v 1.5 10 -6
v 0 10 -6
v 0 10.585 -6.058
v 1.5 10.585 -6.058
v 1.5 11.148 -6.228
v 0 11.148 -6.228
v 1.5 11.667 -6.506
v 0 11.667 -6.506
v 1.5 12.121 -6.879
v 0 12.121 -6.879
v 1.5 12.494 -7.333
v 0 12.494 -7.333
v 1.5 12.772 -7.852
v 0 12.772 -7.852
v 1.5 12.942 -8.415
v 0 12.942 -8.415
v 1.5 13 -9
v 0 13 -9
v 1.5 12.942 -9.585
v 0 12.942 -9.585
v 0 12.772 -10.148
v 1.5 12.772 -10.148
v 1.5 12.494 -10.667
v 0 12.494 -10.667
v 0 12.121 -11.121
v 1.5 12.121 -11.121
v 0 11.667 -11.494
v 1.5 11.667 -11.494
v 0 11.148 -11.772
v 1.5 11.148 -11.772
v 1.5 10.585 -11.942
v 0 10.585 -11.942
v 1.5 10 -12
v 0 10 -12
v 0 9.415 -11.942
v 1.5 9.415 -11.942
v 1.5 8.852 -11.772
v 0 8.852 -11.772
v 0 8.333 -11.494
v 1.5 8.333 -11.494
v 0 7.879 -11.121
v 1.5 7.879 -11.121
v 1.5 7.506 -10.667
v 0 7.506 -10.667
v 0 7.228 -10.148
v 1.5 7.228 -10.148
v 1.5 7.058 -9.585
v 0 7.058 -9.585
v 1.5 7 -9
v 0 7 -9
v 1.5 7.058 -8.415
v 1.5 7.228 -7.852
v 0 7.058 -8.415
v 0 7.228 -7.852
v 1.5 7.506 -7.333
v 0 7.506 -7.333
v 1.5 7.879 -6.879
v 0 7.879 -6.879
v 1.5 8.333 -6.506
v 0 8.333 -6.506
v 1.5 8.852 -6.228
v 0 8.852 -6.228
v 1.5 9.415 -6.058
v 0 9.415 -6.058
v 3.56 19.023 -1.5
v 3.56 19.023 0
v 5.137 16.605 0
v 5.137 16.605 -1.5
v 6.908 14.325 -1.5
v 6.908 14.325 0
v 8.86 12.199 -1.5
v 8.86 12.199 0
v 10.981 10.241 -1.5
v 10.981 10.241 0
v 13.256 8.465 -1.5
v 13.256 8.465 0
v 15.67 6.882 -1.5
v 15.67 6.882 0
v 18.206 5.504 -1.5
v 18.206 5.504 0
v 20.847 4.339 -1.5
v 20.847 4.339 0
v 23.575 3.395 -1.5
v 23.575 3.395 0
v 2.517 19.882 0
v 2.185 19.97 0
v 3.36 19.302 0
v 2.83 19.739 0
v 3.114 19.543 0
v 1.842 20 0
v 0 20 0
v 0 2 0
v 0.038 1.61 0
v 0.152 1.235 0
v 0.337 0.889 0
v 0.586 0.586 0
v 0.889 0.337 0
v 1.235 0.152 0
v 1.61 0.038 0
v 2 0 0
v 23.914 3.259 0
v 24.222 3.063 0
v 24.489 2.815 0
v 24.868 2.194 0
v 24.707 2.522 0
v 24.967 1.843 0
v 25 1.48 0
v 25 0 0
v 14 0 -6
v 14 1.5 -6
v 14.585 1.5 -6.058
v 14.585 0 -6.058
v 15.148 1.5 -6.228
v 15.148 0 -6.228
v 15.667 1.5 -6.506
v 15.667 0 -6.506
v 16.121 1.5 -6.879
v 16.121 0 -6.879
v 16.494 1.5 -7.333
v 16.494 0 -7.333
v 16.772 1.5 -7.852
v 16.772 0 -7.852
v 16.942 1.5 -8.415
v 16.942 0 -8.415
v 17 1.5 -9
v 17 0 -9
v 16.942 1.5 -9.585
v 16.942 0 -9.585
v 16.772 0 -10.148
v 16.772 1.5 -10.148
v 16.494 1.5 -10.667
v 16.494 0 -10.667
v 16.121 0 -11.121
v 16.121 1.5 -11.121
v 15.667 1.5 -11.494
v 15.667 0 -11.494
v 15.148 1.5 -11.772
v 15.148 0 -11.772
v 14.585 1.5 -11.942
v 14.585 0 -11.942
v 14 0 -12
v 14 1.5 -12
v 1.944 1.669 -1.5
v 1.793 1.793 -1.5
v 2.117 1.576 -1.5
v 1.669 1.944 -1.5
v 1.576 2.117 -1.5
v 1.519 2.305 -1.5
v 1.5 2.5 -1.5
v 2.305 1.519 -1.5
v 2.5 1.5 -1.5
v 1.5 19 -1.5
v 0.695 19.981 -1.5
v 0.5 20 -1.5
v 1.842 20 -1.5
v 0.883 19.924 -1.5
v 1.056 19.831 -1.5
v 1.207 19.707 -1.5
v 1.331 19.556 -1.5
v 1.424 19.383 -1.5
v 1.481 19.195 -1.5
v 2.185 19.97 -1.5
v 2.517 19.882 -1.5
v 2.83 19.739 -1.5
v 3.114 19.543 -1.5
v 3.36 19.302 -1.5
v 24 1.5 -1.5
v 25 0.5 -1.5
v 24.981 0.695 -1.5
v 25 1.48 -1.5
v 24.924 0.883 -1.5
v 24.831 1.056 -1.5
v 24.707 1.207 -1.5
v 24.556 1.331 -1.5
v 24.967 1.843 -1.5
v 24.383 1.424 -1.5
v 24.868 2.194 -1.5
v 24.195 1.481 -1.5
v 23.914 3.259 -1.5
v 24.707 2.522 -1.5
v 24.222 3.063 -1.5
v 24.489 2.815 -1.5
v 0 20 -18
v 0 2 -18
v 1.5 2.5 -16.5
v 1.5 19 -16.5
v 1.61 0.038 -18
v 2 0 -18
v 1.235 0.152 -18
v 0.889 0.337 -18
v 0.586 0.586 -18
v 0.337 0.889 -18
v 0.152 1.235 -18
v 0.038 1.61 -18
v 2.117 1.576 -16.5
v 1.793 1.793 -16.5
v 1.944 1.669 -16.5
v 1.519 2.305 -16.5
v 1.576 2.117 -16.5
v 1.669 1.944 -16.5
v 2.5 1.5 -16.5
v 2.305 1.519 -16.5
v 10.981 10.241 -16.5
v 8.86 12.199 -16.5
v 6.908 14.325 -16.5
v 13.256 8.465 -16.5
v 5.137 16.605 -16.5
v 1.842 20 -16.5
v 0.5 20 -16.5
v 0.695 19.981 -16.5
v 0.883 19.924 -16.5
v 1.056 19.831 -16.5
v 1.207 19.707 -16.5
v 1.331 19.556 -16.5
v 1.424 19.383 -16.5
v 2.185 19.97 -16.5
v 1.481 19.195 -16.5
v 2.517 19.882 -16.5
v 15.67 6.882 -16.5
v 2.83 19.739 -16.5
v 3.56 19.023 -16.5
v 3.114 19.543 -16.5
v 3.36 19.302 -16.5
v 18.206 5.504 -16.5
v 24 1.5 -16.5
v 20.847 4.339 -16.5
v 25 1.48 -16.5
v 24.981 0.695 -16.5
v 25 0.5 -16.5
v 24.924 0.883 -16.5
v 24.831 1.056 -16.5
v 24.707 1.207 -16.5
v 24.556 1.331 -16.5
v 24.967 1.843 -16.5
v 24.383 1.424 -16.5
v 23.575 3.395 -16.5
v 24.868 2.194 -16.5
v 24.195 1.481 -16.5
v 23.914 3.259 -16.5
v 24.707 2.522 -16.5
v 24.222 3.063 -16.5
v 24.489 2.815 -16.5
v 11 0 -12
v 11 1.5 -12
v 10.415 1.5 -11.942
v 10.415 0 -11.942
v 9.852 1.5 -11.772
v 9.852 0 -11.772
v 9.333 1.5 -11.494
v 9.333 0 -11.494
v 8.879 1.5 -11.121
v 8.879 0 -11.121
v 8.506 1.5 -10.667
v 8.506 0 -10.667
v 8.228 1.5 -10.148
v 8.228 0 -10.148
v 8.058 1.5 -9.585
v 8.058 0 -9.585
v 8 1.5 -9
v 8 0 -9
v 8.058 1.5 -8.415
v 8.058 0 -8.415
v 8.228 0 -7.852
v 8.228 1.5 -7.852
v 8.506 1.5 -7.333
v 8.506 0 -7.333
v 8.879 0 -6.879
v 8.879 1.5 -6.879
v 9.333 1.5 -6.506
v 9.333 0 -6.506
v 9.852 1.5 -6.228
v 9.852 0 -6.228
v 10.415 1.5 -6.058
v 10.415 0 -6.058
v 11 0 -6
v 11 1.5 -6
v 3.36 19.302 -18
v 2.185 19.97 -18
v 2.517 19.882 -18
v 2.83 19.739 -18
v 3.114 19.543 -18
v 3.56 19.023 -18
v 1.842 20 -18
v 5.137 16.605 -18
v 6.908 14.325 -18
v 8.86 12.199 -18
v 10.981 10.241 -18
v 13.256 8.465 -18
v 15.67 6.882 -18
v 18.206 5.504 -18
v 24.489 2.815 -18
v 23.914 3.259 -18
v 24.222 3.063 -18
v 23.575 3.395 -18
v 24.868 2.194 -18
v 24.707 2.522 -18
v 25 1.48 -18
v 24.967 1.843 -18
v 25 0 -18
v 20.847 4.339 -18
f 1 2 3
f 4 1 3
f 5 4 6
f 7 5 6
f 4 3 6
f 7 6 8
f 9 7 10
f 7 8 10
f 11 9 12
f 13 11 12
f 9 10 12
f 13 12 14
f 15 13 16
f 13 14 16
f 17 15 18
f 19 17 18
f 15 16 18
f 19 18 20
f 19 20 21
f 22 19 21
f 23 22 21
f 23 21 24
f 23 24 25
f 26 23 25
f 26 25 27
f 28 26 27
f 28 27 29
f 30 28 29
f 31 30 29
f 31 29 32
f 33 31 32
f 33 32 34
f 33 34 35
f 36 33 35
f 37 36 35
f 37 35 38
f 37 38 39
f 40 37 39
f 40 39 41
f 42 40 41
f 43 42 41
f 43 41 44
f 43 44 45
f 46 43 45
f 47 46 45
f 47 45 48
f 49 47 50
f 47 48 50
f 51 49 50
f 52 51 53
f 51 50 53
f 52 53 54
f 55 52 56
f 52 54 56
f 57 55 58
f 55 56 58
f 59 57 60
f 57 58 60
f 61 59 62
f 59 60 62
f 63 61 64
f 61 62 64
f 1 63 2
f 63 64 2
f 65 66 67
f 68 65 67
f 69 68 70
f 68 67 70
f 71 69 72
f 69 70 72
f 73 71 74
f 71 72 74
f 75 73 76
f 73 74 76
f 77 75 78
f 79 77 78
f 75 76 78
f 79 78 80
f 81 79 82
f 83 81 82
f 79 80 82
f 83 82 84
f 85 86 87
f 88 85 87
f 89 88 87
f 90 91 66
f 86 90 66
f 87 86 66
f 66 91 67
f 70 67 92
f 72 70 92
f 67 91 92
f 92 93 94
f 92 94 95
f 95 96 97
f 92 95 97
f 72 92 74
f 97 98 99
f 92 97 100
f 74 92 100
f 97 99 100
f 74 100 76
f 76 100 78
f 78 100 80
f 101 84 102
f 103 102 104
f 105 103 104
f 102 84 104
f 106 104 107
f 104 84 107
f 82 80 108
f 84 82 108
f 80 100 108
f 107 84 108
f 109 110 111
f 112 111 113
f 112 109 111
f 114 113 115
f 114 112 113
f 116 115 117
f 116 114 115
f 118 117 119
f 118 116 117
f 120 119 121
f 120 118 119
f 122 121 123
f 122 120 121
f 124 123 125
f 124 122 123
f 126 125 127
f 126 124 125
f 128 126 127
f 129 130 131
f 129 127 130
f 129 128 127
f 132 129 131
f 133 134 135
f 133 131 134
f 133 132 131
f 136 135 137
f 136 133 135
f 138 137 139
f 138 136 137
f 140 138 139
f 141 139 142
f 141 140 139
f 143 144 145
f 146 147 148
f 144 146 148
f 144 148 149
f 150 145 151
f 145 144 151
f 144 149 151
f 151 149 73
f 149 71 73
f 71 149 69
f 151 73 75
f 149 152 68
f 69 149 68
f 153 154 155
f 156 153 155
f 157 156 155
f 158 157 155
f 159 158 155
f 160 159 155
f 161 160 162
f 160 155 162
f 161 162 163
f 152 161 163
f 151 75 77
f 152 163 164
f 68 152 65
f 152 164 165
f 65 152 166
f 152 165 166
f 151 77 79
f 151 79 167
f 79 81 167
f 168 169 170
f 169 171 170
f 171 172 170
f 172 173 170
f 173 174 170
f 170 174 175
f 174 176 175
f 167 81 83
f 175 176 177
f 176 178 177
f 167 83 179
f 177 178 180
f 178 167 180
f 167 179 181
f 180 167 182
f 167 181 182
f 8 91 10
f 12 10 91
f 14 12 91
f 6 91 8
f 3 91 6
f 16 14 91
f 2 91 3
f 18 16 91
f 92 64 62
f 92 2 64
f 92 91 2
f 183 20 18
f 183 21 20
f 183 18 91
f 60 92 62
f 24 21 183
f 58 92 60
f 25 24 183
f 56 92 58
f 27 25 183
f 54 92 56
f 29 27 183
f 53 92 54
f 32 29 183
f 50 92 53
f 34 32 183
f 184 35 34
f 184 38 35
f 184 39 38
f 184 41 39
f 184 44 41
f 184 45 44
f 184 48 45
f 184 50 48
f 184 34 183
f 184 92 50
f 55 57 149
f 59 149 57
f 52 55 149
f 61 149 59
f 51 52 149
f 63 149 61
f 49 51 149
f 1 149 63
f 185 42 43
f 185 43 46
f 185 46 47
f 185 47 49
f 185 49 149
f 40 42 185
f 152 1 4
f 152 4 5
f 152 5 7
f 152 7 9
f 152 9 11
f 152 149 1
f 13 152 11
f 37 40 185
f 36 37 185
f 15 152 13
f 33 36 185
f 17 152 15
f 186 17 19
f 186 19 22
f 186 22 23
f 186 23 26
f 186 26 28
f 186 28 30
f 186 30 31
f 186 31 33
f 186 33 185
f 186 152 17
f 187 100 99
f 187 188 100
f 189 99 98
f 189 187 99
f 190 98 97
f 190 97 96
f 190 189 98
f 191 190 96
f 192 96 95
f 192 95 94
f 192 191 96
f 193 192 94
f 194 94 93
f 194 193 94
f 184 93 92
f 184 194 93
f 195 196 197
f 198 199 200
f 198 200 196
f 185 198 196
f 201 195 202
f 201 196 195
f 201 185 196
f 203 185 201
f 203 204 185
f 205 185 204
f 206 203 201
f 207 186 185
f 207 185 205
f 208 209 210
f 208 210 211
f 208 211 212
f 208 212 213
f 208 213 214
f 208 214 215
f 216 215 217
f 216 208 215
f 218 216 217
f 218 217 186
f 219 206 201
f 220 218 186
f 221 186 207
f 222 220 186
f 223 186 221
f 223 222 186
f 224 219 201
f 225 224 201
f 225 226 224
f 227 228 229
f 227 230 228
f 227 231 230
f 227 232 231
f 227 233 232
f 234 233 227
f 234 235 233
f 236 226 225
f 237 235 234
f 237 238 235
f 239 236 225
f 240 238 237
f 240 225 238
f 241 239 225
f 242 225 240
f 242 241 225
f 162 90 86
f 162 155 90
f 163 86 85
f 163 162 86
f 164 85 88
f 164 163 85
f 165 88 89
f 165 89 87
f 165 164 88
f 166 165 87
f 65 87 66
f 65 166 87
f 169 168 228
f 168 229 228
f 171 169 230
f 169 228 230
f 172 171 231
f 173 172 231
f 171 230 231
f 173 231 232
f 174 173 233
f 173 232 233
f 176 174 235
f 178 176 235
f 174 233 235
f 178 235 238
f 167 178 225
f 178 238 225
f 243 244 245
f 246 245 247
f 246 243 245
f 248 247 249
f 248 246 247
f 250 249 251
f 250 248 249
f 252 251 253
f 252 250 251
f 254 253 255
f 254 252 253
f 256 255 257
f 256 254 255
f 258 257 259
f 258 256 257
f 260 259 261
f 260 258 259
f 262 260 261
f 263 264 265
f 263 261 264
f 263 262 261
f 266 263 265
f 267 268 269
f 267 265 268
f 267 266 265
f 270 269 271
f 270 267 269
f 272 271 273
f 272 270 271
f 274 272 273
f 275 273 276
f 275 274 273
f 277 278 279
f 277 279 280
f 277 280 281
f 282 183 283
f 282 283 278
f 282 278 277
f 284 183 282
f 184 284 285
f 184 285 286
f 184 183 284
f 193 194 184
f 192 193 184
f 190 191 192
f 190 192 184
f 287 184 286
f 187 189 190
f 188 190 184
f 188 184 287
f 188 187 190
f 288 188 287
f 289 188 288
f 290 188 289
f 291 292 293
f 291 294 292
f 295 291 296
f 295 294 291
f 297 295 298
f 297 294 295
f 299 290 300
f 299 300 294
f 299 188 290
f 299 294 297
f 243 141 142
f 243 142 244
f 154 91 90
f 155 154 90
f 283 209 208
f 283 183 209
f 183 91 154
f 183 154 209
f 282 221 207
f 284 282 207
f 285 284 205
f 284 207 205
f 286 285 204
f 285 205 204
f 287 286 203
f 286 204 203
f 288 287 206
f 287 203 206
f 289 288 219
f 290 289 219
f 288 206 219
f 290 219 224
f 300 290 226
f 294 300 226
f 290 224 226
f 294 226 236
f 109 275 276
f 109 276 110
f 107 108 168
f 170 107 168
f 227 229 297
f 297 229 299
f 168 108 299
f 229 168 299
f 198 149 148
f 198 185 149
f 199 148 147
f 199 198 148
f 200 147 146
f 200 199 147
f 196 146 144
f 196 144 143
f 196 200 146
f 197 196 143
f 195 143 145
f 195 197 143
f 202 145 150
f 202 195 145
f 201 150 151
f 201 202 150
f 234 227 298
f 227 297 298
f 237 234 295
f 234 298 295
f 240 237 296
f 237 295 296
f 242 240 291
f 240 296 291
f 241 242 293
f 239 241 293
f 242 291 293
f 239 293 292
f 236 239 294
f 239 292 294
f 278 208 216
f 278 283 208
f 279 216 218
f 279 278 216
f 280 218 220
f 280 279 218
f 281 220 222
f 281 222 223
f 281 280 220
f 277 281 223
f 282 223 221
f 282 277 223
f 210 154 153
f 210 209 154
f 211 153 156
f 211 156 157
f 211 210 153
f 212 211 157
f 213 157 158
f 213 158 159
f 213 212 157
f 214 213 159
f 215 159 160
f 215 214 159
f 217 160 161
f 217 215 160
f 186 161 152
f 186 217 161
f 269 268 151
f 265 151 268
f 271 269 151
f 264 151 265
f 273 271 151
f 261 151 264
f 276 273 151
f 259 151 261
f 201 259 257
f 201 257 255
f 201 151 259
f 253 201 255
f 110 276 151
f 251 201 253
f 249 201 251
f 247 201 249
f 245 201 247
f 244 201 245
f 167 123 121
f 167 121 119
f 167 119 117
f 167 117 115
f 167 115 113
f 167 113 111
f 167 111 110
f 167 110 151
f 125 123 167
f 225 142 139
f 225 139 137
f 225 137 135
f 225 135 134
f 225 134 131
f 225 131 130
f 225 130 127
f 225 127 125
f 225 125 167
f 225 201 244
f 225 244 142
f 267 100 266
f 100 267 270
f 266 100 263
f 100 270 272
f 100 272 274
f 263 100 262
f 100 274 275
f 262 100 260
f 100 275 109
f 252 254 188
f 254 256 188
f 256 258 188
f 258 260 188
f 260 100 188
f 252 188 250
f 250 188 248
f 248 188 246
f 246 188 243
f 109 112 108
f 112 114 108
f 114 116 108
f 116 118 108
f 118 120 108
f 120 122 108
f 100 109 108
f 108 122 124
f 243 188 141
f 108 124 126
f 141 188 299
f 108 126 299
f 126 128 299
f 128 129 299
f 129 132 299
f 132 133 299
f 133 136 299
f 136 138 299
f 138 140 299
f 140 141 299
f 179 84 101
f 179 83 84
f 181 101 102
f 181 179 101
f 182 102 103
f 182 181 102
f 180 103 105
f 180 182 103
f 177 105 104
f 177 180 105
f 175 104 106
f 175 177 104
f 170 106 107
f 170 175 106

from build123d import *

# Parameters (mm, degrees)
SKETCH_1_W          = 25
SKETCH_1_H          = 18
EXTRUDE_1_DEPTH     = 20
CUT_EXTRUDE_1_DEPTH = 20
SKETCH_3_R          = 3
CUT_EXTRUDE_2_DEPTH = 26
CUT_EXTRUDE_3_DEPTH = 21.0000001
SKETCH_5_W          = 23.5
SKETCH_5_H          = 15
CUT_EXTRUDE_4_DEPTH = 18.5
FILLET_1_R          = 1
FILLET_2_R          = 2


with BuildPart() as part:
    # 스케치1 → 보스-돌출1 (new body)
    with BuildSketch(Plane(origin=(0, 0, 0), x_dir=(1, 0, 0), z_dir=(0, 1, 0))):
        with Locations((12.5, 9)):
            Rectangle(SKETCH_1_W, SKETCH_1_H)
    extrude(amount=EXTRUDE_1_DEPTH)

    # 스케치2 → 컷-돌출1 (cut)
    with BuildSketch(Plane.XY):
        with BuildLine():
            ThreePointArc((3, 20), (12.2395604, 9.221784047), (25, 3))
            Line((25, 3), (25, 20))
            Line((25, 20), (3, 20))
        make_face()
        with BuildLine():
            Line((25, 20), (25, 3))
            ThreePointArc((25, 3), (55.118027728, 9.281565928), (68.640222938, 36.916759096))
            ThreePointArc((68.640222938, 36.916759096), (24.905459141, 70.809293693), (3, 20))
            Line((3, 20), (25, 20))
        make_face()
    extrude(amount=-CUT_EXTRUDE_1_DEPTH, mode=Mode.SUBTRACT)

    # 스케치3 → 컷-돌출2 (cut, through all)
    with BuildSketch(Plane.ZY):
        with Locations((-9, 10)):
            Circle(SKETCH_3_R)
    extrude(amount=-CUT_EXTRUDE_2_DEPTH, mode=Mode.SUBTRACT)

    # 스케치4 → 컷-돌출3 (cut, through all)
    with BuildSketch(Plane.XZ):
        with BuildLine():
            Line((11, -6), (14, -6))
            ThreePointArc((14, -6), (17, -9), (14, -12))
            Line((14, -12), (11, -12))
            ThreePointArc((11, -12), (8, -9), (11, -6))
        make_face()
    extrude(amount=-CUT_EXTRUDE_3_DEPTH, mode=Mode.SUBTRACT)

    # 스케치5 → 컷-돌출4 (cut)
    with BuildSketch(Plane(origin=(0, 20, 0), x_dir=(1, 0, 0), z_dir=(0, 1, 0))):
        with Locations((13.25, 9)):
            Rectangle(SKETCH_5_W, SKETCH_5_H)
    extrude(amount=-CUT_EXTRUDE_4_DEPTH, mode=Mode.SUBTRACT)

    # 필렛1
    fillet_1_edges = [part.edges().sort_by_distance(p)[0] for p in [
        (25, 1.5, -9),
        (1.5, 20, -9),
        (1.5, 1.5, -9),
    ]]
    fillet(fillet_1_edges, radius=FILLET_1_R)

    # 필렛2
    fillet_2_edges = [part.edges().sort_by_distance(p)[0] for p in [
        (3, 20, -0.75),
        (25, 3, -17.25),
        (0, 0, -9),
        (3, 20, -17.25),
        (25, 3, -0.75),
    ]]
    fillet(fillet_2_edges, radius=FILLET_2_R)


solid = part.part
